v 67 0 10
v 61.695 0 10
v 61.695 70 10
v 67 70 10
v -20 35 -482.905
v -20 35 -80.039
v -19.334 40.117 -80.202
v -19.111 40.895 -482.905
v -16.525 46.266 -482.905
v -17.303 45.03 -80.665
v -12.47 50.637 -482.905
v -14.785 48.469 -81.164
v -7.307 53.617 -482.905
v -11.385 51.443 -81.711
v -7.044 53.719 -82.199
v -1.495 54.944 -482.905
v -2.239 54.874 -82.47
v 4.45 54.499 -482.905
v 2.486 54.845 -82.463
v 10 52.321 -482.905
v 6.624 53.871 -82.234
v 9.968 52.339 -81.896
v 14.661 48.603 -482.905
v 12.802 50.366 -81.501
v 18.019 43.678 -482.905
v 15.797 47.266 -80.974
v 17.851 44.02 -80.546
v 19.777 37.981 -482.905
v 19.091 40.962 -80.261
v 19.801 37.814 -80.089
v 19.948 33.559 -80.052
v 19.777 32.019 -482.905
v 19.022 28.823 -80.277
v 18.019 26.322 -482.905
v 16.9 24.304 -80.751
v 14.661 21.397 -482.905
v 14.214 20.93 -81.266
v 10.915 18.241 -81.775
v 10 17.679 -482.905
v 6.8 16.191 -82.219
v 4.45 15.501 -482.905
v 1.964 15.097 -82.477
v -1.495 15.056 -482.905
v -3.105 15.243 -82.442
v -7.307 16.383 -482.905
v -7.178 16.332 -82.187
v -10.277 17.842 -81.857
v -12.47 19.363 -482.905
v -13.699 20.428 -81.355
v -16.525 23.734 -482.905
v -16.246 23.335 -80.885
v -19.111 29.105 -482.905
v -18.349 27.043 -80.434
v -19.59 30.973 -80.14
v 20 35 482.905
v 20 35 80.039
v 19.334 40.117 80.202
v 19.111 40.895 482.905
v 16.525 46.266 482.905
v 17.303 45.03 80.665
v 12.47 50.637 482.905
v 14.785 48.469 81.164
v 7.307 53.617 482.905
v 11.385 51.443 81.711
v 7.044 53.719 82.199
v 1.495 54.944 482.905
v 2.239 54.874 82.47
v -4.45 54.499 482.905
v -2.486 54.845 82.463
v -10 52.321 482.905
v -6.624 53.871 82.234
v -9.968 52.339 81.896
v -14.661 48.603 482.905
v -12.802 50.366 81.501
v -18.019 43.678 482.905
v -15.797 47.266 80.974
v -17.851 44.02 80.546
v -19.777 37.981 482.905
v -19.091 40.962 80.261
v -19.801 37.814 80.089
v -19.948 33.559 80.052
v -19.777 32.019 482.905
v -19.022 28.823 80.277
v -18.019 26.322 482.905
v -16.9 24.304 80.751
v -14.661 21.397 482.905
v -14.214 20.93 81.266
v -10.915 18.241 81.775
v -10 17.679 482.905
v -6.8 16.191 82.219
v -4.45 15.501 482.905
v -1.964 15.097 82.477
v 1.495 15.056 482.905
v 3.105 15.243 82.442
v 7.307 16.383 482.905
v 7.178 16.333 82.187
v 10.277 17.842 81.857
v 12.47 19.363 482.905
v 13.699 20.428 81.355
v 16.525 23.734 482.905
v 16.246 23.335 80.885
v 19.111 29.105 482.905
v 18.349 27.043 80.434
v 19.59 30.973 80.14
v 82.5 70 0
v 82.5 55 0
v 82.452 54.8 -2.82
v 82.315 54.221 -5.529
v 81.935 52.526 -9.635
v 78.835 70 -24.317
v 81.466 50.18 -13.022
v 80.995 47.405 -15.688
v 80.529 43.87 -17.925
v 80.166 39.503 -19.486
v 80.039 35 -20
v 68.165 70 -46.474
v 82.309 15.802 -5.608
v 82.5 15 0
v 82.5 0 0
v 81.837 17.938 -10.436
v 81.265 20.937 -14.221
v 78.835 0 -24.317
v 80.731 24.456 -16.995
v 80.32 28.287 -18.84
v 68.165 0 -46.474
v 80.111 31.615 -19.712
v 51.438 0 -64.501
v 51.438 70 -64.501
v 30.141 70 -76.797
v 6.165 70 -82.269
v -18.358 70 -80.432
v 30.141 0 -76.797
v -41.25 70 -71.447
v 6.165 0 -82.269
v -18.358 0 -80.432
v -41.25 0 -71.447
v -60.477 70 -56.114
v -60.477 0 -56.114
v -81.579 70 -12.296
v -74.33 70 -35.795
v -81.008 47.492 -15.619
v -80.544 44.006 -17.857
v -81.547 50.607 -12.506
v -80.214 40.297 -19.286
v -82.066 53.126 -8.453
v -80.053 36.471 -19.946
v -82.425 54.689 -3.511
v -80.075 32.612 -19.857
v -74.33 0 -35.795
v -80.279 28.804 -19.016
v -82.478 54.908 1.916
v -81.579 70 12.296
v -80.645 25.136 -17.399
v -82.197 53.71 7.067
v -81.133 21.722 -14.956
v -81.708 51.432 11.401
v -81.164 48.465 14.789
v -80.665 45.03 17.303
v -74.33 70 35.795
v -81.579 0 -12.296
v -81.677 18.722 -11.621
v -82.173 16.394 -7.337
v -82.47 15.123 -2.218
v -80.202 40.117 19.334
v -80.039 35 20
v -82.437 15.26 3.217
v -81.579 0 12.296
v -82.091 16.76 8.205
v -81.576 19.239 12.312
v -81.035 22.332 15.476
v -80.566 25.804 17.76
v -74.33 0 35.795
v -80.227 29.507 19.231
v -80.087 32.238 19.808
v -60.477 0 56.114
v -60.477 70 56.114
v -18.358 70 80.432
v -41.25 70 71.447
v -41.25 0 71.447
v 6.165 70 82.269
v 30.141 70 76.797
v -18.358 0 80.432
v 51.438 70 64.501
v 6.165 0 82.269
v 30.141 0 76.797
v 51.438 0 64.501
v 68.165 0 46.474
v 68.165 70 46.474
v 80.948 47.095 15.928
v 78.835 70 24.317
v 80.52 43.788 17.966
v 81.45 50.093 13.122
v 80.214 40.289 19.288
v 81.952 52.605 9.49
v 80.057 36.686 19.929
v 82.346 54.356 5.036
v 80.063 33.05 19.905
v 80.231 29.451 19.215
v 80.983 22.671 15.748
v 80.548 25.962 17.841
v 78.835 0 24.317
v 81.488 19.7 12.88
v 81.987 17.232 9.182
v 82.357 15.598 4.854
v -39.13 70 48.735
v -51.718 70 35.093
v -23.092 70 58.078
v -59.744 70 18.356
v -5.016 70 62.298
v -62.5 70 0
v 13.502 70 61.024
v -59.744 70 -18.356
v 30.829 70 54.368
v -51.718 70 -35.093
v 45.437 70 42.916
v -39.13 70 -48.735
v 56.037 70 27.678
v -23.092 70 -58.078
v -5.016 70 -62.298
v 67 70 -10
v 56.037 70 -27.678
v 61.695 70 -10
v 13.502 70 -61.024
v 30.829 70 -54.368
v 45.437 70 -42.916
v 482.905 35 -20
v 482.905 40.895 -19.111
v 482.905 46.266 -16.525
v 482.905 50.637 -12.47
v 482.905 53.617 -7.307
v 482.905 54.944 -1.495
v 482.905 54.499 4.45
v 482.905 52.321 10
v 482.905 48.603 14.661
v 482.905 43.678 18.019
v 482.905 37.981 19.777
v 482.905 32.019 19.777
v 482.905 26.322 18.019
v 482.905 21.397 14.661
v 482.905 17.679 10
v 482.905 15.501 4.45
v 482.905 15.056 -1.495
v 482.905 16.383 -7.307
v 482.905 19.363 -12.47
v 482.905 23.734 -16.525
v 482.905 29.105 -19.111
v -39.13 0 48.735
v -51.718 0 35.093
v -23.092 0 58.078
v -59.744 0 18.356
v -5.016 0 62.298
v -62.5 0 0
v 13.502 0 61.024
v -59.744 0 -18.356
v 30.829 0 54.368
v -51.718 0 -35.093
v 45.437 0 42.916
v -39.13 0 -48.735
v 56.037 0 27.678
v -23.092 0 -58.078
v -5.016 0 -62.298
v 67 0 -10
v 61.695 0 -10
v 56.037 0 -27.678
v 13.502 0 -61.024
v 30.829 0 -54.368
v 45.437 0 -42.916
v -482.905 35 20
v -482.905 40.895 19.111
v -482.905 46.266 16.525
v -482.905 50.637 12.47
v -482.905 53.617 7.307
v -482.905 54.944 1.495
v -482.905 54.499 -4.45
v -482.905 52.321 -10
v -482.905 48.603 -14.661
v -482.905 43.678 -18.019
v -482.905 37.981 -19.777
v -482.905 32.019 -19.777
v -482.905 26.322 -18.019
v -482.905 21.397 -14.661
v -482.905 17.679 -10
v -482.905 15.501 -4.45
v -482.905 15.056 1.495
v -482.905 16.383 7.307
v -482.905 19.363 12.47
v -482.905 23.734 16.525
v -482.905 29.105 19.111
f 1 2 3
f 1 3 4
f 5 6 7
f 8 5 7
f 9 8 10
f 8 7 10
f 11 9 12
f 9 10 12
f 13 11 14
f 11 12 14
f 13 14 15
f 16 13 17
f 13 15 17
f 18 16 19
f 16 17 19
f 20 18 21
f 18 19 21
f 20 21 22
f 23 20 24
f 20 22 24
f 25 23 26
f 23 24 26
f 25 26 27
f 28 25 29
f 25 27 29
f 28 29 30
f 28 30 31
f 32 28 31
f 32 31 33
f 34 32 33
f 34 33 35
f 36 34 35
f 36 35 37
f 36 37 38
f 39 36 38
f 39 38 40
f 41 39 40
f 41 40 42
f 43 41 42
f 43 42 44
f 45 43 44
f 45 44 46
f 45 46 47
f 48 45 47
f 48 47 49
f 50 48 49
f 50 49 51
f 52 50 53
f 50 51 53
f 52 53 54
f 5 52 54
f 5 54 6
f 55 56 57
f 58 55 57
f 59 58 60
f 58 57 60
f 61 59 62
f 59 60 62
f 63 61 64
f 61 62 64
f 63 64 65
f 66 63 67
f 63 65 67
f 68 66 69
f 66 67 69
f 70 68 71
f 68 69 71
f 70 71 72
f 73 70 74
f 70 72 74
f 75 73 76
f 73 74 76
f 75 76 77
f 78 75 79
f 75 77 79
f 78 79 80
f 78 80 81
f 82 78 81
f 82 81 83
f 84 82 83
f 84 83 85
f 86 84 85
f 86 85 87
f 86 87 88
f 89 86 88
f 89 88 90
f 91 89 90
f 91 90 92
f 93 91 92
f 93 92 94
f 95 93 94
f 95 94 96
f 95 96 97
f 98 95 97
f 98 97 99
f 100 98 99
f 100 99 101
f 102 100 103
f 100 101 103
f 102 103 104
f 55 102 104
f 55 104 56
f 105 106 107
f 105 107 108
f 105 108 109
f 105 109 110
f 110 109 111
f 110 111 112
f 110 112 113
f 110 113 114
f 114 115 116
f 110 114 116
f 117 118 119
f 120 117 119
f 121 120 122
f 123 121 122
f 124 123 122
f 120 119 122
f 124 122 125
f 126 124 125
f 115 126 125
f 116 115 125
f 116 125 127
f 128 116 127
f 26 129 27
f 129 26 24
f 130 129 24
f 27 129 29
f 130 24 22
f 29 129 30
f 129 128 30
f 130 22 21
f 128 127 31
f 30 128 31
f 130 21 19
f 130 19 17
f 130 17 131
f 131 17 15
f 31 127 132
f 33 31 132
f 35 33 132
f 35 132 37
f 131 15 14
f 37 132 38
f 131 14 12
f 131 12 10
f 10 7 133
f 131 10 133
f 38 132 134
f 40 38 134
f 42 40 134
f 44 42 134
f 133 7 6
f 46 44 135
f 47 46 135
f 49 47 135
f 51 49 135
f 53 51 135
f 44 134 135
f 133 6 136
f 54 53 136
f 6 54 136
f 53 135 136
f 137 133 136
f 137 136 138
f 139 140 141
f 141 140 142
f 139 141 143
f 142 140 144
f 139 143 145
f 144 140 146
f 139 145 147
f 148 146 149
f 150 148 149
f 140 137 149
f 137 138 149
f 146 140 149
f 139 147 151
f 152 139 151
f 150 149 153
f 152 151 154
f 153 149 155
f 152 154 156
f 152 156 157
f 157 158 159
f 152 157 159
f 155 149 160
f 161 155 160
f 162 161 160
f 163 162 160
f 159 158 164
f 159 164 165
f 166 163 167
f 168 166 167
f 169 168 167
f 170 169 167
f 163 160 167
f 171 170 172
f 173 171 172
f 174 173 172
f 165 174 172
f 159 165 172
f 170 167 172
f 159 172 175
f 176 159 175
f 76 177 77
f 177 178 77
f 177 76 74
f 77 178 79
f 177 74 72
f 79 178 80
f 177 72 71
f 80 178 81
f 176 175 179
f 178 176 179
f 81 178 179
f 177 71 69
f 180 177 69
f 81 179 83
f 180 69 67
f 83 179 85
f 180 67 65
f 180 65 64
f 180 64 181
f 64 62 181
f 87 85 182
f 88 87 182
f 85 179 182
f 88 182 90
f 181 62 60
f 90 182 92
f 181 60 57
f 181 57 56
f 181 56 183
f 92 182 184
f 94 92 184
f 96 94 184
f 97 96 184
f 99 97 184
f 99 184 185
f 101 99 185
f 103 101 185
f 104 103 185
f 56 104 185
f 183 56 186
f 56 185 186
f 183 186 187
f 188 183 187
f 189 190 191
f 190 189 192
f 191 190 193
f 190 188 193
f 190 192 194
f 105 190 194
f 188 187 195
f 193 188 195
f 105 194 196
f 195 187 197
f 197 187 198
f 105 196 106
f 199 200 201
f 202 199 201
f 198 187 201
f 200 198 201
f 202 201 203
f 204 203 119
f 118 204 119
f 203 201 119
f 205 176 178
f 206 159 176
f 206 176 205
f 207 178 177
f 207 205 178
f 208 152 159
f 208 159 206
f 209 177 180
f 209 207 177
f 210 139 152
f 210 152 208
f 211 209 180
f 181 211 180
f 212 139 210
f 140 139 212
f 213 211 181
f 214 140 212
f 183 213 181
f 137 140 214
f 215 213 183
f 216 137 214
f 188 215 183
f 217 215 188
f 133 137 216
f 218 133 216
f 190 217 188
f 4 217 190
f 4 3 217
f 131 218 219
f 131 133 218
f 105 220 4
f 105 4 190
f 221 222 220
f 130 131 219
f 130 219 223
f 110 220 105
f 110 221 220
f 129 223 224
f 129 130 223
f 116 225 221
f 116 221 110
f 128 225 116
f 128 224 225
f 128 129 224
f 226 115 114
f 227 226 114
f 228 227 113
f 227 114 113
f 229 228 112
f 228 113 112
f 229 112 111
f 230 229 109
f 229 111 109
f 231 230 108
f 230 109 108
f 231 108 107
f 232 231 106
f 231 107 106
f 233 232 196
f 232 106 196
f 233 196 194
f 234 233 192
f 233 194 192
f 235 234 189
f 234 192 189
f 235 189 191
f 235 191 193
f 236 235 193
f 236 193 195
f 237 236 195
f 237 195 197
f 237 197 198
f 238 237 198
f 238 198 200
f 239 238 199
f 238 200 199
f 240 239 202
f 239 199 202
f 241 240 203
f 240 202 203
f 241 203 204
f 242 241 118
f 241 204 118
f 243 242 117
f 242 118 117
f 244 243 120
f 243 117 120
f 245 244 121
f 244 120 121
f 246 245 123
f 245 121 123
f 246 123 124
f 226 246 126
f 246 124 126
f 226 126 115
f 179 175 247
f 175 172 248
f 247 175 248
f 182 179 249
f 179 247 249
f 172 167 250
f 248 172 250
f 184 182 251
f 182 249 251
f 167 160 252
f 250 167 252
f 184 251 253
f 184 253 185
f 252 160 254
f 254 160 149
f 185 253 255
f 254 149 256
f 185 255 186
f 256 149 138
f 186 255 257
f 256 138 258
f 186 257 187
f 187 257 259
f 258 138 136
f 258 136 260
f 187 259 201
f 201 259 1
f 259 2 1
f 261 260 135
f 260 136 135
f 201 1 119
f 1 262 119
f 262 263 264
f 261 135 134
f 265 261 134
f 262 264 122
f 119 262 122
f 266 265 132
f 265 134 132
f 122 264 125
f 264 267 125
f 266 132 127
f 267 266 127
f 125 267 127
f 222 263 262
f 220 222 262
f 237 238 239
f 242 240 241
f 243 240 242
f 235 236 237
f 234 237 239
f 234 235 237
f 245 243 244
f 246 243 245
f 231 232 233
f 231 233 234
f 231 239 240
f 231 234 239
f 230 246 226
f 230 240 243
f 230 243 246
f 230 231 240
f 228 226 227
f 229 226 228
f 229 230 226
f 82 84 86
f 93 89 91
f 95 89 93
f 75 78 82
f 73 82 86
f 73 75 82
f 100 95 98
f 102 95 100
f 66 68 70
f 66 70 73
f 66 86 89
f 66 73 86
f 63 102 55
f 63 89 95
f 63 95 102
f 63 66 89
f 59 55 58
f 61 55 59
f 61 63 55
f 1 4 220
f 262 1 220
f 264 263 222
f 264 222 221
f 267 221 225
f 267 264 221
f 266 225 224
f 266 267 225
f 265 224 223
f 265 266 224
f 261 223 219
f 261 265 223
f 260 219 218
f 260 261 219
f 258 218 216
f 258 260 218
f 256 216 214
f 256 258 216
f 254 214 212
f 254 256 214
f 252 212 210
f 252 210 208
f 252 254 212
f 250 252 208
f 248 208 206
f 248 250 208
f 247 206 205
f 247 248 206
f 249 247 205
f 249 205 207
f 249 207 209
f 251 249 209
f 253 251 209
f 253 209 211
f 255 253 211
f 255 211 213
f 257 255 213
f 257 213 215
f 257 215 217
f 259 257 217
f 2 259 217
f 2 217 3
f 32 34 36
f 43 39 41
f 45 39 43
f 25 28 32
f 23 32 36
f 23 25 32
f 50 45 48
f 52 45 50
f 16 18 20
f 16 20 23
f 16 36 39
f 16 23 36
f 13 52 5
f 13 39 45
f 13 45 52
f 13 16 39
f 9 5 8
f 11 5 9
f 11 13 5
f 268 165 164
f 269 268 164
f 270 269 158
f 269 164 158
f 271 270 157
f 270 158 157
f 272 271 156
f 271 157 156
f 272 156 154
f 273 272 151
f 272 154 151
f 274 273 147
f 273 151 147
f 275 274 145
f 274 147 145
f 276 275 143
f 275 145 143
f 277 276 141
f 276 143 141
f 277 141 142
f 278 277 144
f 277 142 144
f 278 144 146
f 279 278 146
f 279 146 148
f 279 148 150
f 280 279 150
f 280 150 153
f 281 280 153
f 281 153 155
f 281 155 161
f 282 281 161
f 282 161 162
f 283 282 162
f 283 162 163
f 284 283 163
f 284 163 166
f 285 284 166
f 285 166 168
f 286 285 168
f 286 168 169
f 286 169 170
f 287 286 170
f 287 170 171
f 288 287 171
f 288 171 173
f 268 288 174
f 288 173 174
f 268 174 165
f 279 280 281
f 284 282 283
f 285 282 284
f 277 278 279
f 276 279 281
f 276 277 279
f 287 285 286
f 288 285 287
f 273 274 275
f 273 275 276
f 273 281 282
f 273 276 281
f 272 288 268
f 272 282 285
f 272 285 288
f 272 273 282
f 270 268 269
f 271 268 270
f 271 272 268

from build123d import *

# Parameters (mm, degrees)
IZIM1_R                     = 82.5
IZIM1_R_2                   = 62.5
Y_KSEKLIK_EKSTR_ZYON1_DEPTH = 70
IZIM2_R                     = 20
Y_KSEKLIK_EKSTR_ZYON2_DEPTH = 405
DAIRESEL_KAPLAMA1_COUNT     = 4
IZIM4_W                     = 15
IZIM4_H                     = 20
KES_EKSTR_ZYON1_DEPTH       = 71.0000001


with BuildPart() as part:
    # Çizim1 → Yükseklik-Ekstrüzyon1 (new body)
    with BuildSketch(Plane(origin=(0, 0, 0), x_dir=(1, 0, 0), z_dir=(0, 1, 0))):
        Circle(IZIM1_R)
        Circle(IZIM1_R_2, mode=Mode.SUBTRACT)
    extrude(amount=Y_KSEKLIK_EKSTR_ZYON1_DEPTH)

    # Çizim2 → Yükseklik-Ekstrüzyon2 (add)
    with BuildSketch(Plane(origin=(77.904802992, 0, 0), x_dir=(0, 0, -1), z_dir=(1, 0, 0))):
        with Locations((0, 35)):
            Circle(IZIM2_R)
    y_kseklik_ekstr_zyon2 = extrude(amount=Y_KSEKLIK_EKSTR_ZYON2_DEPTH)

    # Dairesel Kaplama1: Yükseklik-Ekstrüzyon2 ×4 about axis
    dairesel_kaplama1_axis = Axis((0, 0, 0), (0, 1, 0))
    for i in range(1, DAIRESEL_KAPLAMA1_COUNT):
        add(y_kseklik_ekstr_zyon2.rotate(dairesel_kaplama1_axis, i * 360 / DAIRESEL_KAPLAMA1_COUNT))

    # Çizim4 → Kes-Ekstrüzyon1 (cut, through all)
    with BuildSketch(Plane(origin=(0, 70, 0), x_dir=(1, 0, 0), z_dir=(0, 1, 0))):
        with Locations((59.5, 0)):
            Rectangle(IZIM4_W, IZIM4_H)
    extrude(amount=-KES_EKSTR_ZYON1_DEPTH, mode=Mode.SUBTRACT)


solid = part.part
